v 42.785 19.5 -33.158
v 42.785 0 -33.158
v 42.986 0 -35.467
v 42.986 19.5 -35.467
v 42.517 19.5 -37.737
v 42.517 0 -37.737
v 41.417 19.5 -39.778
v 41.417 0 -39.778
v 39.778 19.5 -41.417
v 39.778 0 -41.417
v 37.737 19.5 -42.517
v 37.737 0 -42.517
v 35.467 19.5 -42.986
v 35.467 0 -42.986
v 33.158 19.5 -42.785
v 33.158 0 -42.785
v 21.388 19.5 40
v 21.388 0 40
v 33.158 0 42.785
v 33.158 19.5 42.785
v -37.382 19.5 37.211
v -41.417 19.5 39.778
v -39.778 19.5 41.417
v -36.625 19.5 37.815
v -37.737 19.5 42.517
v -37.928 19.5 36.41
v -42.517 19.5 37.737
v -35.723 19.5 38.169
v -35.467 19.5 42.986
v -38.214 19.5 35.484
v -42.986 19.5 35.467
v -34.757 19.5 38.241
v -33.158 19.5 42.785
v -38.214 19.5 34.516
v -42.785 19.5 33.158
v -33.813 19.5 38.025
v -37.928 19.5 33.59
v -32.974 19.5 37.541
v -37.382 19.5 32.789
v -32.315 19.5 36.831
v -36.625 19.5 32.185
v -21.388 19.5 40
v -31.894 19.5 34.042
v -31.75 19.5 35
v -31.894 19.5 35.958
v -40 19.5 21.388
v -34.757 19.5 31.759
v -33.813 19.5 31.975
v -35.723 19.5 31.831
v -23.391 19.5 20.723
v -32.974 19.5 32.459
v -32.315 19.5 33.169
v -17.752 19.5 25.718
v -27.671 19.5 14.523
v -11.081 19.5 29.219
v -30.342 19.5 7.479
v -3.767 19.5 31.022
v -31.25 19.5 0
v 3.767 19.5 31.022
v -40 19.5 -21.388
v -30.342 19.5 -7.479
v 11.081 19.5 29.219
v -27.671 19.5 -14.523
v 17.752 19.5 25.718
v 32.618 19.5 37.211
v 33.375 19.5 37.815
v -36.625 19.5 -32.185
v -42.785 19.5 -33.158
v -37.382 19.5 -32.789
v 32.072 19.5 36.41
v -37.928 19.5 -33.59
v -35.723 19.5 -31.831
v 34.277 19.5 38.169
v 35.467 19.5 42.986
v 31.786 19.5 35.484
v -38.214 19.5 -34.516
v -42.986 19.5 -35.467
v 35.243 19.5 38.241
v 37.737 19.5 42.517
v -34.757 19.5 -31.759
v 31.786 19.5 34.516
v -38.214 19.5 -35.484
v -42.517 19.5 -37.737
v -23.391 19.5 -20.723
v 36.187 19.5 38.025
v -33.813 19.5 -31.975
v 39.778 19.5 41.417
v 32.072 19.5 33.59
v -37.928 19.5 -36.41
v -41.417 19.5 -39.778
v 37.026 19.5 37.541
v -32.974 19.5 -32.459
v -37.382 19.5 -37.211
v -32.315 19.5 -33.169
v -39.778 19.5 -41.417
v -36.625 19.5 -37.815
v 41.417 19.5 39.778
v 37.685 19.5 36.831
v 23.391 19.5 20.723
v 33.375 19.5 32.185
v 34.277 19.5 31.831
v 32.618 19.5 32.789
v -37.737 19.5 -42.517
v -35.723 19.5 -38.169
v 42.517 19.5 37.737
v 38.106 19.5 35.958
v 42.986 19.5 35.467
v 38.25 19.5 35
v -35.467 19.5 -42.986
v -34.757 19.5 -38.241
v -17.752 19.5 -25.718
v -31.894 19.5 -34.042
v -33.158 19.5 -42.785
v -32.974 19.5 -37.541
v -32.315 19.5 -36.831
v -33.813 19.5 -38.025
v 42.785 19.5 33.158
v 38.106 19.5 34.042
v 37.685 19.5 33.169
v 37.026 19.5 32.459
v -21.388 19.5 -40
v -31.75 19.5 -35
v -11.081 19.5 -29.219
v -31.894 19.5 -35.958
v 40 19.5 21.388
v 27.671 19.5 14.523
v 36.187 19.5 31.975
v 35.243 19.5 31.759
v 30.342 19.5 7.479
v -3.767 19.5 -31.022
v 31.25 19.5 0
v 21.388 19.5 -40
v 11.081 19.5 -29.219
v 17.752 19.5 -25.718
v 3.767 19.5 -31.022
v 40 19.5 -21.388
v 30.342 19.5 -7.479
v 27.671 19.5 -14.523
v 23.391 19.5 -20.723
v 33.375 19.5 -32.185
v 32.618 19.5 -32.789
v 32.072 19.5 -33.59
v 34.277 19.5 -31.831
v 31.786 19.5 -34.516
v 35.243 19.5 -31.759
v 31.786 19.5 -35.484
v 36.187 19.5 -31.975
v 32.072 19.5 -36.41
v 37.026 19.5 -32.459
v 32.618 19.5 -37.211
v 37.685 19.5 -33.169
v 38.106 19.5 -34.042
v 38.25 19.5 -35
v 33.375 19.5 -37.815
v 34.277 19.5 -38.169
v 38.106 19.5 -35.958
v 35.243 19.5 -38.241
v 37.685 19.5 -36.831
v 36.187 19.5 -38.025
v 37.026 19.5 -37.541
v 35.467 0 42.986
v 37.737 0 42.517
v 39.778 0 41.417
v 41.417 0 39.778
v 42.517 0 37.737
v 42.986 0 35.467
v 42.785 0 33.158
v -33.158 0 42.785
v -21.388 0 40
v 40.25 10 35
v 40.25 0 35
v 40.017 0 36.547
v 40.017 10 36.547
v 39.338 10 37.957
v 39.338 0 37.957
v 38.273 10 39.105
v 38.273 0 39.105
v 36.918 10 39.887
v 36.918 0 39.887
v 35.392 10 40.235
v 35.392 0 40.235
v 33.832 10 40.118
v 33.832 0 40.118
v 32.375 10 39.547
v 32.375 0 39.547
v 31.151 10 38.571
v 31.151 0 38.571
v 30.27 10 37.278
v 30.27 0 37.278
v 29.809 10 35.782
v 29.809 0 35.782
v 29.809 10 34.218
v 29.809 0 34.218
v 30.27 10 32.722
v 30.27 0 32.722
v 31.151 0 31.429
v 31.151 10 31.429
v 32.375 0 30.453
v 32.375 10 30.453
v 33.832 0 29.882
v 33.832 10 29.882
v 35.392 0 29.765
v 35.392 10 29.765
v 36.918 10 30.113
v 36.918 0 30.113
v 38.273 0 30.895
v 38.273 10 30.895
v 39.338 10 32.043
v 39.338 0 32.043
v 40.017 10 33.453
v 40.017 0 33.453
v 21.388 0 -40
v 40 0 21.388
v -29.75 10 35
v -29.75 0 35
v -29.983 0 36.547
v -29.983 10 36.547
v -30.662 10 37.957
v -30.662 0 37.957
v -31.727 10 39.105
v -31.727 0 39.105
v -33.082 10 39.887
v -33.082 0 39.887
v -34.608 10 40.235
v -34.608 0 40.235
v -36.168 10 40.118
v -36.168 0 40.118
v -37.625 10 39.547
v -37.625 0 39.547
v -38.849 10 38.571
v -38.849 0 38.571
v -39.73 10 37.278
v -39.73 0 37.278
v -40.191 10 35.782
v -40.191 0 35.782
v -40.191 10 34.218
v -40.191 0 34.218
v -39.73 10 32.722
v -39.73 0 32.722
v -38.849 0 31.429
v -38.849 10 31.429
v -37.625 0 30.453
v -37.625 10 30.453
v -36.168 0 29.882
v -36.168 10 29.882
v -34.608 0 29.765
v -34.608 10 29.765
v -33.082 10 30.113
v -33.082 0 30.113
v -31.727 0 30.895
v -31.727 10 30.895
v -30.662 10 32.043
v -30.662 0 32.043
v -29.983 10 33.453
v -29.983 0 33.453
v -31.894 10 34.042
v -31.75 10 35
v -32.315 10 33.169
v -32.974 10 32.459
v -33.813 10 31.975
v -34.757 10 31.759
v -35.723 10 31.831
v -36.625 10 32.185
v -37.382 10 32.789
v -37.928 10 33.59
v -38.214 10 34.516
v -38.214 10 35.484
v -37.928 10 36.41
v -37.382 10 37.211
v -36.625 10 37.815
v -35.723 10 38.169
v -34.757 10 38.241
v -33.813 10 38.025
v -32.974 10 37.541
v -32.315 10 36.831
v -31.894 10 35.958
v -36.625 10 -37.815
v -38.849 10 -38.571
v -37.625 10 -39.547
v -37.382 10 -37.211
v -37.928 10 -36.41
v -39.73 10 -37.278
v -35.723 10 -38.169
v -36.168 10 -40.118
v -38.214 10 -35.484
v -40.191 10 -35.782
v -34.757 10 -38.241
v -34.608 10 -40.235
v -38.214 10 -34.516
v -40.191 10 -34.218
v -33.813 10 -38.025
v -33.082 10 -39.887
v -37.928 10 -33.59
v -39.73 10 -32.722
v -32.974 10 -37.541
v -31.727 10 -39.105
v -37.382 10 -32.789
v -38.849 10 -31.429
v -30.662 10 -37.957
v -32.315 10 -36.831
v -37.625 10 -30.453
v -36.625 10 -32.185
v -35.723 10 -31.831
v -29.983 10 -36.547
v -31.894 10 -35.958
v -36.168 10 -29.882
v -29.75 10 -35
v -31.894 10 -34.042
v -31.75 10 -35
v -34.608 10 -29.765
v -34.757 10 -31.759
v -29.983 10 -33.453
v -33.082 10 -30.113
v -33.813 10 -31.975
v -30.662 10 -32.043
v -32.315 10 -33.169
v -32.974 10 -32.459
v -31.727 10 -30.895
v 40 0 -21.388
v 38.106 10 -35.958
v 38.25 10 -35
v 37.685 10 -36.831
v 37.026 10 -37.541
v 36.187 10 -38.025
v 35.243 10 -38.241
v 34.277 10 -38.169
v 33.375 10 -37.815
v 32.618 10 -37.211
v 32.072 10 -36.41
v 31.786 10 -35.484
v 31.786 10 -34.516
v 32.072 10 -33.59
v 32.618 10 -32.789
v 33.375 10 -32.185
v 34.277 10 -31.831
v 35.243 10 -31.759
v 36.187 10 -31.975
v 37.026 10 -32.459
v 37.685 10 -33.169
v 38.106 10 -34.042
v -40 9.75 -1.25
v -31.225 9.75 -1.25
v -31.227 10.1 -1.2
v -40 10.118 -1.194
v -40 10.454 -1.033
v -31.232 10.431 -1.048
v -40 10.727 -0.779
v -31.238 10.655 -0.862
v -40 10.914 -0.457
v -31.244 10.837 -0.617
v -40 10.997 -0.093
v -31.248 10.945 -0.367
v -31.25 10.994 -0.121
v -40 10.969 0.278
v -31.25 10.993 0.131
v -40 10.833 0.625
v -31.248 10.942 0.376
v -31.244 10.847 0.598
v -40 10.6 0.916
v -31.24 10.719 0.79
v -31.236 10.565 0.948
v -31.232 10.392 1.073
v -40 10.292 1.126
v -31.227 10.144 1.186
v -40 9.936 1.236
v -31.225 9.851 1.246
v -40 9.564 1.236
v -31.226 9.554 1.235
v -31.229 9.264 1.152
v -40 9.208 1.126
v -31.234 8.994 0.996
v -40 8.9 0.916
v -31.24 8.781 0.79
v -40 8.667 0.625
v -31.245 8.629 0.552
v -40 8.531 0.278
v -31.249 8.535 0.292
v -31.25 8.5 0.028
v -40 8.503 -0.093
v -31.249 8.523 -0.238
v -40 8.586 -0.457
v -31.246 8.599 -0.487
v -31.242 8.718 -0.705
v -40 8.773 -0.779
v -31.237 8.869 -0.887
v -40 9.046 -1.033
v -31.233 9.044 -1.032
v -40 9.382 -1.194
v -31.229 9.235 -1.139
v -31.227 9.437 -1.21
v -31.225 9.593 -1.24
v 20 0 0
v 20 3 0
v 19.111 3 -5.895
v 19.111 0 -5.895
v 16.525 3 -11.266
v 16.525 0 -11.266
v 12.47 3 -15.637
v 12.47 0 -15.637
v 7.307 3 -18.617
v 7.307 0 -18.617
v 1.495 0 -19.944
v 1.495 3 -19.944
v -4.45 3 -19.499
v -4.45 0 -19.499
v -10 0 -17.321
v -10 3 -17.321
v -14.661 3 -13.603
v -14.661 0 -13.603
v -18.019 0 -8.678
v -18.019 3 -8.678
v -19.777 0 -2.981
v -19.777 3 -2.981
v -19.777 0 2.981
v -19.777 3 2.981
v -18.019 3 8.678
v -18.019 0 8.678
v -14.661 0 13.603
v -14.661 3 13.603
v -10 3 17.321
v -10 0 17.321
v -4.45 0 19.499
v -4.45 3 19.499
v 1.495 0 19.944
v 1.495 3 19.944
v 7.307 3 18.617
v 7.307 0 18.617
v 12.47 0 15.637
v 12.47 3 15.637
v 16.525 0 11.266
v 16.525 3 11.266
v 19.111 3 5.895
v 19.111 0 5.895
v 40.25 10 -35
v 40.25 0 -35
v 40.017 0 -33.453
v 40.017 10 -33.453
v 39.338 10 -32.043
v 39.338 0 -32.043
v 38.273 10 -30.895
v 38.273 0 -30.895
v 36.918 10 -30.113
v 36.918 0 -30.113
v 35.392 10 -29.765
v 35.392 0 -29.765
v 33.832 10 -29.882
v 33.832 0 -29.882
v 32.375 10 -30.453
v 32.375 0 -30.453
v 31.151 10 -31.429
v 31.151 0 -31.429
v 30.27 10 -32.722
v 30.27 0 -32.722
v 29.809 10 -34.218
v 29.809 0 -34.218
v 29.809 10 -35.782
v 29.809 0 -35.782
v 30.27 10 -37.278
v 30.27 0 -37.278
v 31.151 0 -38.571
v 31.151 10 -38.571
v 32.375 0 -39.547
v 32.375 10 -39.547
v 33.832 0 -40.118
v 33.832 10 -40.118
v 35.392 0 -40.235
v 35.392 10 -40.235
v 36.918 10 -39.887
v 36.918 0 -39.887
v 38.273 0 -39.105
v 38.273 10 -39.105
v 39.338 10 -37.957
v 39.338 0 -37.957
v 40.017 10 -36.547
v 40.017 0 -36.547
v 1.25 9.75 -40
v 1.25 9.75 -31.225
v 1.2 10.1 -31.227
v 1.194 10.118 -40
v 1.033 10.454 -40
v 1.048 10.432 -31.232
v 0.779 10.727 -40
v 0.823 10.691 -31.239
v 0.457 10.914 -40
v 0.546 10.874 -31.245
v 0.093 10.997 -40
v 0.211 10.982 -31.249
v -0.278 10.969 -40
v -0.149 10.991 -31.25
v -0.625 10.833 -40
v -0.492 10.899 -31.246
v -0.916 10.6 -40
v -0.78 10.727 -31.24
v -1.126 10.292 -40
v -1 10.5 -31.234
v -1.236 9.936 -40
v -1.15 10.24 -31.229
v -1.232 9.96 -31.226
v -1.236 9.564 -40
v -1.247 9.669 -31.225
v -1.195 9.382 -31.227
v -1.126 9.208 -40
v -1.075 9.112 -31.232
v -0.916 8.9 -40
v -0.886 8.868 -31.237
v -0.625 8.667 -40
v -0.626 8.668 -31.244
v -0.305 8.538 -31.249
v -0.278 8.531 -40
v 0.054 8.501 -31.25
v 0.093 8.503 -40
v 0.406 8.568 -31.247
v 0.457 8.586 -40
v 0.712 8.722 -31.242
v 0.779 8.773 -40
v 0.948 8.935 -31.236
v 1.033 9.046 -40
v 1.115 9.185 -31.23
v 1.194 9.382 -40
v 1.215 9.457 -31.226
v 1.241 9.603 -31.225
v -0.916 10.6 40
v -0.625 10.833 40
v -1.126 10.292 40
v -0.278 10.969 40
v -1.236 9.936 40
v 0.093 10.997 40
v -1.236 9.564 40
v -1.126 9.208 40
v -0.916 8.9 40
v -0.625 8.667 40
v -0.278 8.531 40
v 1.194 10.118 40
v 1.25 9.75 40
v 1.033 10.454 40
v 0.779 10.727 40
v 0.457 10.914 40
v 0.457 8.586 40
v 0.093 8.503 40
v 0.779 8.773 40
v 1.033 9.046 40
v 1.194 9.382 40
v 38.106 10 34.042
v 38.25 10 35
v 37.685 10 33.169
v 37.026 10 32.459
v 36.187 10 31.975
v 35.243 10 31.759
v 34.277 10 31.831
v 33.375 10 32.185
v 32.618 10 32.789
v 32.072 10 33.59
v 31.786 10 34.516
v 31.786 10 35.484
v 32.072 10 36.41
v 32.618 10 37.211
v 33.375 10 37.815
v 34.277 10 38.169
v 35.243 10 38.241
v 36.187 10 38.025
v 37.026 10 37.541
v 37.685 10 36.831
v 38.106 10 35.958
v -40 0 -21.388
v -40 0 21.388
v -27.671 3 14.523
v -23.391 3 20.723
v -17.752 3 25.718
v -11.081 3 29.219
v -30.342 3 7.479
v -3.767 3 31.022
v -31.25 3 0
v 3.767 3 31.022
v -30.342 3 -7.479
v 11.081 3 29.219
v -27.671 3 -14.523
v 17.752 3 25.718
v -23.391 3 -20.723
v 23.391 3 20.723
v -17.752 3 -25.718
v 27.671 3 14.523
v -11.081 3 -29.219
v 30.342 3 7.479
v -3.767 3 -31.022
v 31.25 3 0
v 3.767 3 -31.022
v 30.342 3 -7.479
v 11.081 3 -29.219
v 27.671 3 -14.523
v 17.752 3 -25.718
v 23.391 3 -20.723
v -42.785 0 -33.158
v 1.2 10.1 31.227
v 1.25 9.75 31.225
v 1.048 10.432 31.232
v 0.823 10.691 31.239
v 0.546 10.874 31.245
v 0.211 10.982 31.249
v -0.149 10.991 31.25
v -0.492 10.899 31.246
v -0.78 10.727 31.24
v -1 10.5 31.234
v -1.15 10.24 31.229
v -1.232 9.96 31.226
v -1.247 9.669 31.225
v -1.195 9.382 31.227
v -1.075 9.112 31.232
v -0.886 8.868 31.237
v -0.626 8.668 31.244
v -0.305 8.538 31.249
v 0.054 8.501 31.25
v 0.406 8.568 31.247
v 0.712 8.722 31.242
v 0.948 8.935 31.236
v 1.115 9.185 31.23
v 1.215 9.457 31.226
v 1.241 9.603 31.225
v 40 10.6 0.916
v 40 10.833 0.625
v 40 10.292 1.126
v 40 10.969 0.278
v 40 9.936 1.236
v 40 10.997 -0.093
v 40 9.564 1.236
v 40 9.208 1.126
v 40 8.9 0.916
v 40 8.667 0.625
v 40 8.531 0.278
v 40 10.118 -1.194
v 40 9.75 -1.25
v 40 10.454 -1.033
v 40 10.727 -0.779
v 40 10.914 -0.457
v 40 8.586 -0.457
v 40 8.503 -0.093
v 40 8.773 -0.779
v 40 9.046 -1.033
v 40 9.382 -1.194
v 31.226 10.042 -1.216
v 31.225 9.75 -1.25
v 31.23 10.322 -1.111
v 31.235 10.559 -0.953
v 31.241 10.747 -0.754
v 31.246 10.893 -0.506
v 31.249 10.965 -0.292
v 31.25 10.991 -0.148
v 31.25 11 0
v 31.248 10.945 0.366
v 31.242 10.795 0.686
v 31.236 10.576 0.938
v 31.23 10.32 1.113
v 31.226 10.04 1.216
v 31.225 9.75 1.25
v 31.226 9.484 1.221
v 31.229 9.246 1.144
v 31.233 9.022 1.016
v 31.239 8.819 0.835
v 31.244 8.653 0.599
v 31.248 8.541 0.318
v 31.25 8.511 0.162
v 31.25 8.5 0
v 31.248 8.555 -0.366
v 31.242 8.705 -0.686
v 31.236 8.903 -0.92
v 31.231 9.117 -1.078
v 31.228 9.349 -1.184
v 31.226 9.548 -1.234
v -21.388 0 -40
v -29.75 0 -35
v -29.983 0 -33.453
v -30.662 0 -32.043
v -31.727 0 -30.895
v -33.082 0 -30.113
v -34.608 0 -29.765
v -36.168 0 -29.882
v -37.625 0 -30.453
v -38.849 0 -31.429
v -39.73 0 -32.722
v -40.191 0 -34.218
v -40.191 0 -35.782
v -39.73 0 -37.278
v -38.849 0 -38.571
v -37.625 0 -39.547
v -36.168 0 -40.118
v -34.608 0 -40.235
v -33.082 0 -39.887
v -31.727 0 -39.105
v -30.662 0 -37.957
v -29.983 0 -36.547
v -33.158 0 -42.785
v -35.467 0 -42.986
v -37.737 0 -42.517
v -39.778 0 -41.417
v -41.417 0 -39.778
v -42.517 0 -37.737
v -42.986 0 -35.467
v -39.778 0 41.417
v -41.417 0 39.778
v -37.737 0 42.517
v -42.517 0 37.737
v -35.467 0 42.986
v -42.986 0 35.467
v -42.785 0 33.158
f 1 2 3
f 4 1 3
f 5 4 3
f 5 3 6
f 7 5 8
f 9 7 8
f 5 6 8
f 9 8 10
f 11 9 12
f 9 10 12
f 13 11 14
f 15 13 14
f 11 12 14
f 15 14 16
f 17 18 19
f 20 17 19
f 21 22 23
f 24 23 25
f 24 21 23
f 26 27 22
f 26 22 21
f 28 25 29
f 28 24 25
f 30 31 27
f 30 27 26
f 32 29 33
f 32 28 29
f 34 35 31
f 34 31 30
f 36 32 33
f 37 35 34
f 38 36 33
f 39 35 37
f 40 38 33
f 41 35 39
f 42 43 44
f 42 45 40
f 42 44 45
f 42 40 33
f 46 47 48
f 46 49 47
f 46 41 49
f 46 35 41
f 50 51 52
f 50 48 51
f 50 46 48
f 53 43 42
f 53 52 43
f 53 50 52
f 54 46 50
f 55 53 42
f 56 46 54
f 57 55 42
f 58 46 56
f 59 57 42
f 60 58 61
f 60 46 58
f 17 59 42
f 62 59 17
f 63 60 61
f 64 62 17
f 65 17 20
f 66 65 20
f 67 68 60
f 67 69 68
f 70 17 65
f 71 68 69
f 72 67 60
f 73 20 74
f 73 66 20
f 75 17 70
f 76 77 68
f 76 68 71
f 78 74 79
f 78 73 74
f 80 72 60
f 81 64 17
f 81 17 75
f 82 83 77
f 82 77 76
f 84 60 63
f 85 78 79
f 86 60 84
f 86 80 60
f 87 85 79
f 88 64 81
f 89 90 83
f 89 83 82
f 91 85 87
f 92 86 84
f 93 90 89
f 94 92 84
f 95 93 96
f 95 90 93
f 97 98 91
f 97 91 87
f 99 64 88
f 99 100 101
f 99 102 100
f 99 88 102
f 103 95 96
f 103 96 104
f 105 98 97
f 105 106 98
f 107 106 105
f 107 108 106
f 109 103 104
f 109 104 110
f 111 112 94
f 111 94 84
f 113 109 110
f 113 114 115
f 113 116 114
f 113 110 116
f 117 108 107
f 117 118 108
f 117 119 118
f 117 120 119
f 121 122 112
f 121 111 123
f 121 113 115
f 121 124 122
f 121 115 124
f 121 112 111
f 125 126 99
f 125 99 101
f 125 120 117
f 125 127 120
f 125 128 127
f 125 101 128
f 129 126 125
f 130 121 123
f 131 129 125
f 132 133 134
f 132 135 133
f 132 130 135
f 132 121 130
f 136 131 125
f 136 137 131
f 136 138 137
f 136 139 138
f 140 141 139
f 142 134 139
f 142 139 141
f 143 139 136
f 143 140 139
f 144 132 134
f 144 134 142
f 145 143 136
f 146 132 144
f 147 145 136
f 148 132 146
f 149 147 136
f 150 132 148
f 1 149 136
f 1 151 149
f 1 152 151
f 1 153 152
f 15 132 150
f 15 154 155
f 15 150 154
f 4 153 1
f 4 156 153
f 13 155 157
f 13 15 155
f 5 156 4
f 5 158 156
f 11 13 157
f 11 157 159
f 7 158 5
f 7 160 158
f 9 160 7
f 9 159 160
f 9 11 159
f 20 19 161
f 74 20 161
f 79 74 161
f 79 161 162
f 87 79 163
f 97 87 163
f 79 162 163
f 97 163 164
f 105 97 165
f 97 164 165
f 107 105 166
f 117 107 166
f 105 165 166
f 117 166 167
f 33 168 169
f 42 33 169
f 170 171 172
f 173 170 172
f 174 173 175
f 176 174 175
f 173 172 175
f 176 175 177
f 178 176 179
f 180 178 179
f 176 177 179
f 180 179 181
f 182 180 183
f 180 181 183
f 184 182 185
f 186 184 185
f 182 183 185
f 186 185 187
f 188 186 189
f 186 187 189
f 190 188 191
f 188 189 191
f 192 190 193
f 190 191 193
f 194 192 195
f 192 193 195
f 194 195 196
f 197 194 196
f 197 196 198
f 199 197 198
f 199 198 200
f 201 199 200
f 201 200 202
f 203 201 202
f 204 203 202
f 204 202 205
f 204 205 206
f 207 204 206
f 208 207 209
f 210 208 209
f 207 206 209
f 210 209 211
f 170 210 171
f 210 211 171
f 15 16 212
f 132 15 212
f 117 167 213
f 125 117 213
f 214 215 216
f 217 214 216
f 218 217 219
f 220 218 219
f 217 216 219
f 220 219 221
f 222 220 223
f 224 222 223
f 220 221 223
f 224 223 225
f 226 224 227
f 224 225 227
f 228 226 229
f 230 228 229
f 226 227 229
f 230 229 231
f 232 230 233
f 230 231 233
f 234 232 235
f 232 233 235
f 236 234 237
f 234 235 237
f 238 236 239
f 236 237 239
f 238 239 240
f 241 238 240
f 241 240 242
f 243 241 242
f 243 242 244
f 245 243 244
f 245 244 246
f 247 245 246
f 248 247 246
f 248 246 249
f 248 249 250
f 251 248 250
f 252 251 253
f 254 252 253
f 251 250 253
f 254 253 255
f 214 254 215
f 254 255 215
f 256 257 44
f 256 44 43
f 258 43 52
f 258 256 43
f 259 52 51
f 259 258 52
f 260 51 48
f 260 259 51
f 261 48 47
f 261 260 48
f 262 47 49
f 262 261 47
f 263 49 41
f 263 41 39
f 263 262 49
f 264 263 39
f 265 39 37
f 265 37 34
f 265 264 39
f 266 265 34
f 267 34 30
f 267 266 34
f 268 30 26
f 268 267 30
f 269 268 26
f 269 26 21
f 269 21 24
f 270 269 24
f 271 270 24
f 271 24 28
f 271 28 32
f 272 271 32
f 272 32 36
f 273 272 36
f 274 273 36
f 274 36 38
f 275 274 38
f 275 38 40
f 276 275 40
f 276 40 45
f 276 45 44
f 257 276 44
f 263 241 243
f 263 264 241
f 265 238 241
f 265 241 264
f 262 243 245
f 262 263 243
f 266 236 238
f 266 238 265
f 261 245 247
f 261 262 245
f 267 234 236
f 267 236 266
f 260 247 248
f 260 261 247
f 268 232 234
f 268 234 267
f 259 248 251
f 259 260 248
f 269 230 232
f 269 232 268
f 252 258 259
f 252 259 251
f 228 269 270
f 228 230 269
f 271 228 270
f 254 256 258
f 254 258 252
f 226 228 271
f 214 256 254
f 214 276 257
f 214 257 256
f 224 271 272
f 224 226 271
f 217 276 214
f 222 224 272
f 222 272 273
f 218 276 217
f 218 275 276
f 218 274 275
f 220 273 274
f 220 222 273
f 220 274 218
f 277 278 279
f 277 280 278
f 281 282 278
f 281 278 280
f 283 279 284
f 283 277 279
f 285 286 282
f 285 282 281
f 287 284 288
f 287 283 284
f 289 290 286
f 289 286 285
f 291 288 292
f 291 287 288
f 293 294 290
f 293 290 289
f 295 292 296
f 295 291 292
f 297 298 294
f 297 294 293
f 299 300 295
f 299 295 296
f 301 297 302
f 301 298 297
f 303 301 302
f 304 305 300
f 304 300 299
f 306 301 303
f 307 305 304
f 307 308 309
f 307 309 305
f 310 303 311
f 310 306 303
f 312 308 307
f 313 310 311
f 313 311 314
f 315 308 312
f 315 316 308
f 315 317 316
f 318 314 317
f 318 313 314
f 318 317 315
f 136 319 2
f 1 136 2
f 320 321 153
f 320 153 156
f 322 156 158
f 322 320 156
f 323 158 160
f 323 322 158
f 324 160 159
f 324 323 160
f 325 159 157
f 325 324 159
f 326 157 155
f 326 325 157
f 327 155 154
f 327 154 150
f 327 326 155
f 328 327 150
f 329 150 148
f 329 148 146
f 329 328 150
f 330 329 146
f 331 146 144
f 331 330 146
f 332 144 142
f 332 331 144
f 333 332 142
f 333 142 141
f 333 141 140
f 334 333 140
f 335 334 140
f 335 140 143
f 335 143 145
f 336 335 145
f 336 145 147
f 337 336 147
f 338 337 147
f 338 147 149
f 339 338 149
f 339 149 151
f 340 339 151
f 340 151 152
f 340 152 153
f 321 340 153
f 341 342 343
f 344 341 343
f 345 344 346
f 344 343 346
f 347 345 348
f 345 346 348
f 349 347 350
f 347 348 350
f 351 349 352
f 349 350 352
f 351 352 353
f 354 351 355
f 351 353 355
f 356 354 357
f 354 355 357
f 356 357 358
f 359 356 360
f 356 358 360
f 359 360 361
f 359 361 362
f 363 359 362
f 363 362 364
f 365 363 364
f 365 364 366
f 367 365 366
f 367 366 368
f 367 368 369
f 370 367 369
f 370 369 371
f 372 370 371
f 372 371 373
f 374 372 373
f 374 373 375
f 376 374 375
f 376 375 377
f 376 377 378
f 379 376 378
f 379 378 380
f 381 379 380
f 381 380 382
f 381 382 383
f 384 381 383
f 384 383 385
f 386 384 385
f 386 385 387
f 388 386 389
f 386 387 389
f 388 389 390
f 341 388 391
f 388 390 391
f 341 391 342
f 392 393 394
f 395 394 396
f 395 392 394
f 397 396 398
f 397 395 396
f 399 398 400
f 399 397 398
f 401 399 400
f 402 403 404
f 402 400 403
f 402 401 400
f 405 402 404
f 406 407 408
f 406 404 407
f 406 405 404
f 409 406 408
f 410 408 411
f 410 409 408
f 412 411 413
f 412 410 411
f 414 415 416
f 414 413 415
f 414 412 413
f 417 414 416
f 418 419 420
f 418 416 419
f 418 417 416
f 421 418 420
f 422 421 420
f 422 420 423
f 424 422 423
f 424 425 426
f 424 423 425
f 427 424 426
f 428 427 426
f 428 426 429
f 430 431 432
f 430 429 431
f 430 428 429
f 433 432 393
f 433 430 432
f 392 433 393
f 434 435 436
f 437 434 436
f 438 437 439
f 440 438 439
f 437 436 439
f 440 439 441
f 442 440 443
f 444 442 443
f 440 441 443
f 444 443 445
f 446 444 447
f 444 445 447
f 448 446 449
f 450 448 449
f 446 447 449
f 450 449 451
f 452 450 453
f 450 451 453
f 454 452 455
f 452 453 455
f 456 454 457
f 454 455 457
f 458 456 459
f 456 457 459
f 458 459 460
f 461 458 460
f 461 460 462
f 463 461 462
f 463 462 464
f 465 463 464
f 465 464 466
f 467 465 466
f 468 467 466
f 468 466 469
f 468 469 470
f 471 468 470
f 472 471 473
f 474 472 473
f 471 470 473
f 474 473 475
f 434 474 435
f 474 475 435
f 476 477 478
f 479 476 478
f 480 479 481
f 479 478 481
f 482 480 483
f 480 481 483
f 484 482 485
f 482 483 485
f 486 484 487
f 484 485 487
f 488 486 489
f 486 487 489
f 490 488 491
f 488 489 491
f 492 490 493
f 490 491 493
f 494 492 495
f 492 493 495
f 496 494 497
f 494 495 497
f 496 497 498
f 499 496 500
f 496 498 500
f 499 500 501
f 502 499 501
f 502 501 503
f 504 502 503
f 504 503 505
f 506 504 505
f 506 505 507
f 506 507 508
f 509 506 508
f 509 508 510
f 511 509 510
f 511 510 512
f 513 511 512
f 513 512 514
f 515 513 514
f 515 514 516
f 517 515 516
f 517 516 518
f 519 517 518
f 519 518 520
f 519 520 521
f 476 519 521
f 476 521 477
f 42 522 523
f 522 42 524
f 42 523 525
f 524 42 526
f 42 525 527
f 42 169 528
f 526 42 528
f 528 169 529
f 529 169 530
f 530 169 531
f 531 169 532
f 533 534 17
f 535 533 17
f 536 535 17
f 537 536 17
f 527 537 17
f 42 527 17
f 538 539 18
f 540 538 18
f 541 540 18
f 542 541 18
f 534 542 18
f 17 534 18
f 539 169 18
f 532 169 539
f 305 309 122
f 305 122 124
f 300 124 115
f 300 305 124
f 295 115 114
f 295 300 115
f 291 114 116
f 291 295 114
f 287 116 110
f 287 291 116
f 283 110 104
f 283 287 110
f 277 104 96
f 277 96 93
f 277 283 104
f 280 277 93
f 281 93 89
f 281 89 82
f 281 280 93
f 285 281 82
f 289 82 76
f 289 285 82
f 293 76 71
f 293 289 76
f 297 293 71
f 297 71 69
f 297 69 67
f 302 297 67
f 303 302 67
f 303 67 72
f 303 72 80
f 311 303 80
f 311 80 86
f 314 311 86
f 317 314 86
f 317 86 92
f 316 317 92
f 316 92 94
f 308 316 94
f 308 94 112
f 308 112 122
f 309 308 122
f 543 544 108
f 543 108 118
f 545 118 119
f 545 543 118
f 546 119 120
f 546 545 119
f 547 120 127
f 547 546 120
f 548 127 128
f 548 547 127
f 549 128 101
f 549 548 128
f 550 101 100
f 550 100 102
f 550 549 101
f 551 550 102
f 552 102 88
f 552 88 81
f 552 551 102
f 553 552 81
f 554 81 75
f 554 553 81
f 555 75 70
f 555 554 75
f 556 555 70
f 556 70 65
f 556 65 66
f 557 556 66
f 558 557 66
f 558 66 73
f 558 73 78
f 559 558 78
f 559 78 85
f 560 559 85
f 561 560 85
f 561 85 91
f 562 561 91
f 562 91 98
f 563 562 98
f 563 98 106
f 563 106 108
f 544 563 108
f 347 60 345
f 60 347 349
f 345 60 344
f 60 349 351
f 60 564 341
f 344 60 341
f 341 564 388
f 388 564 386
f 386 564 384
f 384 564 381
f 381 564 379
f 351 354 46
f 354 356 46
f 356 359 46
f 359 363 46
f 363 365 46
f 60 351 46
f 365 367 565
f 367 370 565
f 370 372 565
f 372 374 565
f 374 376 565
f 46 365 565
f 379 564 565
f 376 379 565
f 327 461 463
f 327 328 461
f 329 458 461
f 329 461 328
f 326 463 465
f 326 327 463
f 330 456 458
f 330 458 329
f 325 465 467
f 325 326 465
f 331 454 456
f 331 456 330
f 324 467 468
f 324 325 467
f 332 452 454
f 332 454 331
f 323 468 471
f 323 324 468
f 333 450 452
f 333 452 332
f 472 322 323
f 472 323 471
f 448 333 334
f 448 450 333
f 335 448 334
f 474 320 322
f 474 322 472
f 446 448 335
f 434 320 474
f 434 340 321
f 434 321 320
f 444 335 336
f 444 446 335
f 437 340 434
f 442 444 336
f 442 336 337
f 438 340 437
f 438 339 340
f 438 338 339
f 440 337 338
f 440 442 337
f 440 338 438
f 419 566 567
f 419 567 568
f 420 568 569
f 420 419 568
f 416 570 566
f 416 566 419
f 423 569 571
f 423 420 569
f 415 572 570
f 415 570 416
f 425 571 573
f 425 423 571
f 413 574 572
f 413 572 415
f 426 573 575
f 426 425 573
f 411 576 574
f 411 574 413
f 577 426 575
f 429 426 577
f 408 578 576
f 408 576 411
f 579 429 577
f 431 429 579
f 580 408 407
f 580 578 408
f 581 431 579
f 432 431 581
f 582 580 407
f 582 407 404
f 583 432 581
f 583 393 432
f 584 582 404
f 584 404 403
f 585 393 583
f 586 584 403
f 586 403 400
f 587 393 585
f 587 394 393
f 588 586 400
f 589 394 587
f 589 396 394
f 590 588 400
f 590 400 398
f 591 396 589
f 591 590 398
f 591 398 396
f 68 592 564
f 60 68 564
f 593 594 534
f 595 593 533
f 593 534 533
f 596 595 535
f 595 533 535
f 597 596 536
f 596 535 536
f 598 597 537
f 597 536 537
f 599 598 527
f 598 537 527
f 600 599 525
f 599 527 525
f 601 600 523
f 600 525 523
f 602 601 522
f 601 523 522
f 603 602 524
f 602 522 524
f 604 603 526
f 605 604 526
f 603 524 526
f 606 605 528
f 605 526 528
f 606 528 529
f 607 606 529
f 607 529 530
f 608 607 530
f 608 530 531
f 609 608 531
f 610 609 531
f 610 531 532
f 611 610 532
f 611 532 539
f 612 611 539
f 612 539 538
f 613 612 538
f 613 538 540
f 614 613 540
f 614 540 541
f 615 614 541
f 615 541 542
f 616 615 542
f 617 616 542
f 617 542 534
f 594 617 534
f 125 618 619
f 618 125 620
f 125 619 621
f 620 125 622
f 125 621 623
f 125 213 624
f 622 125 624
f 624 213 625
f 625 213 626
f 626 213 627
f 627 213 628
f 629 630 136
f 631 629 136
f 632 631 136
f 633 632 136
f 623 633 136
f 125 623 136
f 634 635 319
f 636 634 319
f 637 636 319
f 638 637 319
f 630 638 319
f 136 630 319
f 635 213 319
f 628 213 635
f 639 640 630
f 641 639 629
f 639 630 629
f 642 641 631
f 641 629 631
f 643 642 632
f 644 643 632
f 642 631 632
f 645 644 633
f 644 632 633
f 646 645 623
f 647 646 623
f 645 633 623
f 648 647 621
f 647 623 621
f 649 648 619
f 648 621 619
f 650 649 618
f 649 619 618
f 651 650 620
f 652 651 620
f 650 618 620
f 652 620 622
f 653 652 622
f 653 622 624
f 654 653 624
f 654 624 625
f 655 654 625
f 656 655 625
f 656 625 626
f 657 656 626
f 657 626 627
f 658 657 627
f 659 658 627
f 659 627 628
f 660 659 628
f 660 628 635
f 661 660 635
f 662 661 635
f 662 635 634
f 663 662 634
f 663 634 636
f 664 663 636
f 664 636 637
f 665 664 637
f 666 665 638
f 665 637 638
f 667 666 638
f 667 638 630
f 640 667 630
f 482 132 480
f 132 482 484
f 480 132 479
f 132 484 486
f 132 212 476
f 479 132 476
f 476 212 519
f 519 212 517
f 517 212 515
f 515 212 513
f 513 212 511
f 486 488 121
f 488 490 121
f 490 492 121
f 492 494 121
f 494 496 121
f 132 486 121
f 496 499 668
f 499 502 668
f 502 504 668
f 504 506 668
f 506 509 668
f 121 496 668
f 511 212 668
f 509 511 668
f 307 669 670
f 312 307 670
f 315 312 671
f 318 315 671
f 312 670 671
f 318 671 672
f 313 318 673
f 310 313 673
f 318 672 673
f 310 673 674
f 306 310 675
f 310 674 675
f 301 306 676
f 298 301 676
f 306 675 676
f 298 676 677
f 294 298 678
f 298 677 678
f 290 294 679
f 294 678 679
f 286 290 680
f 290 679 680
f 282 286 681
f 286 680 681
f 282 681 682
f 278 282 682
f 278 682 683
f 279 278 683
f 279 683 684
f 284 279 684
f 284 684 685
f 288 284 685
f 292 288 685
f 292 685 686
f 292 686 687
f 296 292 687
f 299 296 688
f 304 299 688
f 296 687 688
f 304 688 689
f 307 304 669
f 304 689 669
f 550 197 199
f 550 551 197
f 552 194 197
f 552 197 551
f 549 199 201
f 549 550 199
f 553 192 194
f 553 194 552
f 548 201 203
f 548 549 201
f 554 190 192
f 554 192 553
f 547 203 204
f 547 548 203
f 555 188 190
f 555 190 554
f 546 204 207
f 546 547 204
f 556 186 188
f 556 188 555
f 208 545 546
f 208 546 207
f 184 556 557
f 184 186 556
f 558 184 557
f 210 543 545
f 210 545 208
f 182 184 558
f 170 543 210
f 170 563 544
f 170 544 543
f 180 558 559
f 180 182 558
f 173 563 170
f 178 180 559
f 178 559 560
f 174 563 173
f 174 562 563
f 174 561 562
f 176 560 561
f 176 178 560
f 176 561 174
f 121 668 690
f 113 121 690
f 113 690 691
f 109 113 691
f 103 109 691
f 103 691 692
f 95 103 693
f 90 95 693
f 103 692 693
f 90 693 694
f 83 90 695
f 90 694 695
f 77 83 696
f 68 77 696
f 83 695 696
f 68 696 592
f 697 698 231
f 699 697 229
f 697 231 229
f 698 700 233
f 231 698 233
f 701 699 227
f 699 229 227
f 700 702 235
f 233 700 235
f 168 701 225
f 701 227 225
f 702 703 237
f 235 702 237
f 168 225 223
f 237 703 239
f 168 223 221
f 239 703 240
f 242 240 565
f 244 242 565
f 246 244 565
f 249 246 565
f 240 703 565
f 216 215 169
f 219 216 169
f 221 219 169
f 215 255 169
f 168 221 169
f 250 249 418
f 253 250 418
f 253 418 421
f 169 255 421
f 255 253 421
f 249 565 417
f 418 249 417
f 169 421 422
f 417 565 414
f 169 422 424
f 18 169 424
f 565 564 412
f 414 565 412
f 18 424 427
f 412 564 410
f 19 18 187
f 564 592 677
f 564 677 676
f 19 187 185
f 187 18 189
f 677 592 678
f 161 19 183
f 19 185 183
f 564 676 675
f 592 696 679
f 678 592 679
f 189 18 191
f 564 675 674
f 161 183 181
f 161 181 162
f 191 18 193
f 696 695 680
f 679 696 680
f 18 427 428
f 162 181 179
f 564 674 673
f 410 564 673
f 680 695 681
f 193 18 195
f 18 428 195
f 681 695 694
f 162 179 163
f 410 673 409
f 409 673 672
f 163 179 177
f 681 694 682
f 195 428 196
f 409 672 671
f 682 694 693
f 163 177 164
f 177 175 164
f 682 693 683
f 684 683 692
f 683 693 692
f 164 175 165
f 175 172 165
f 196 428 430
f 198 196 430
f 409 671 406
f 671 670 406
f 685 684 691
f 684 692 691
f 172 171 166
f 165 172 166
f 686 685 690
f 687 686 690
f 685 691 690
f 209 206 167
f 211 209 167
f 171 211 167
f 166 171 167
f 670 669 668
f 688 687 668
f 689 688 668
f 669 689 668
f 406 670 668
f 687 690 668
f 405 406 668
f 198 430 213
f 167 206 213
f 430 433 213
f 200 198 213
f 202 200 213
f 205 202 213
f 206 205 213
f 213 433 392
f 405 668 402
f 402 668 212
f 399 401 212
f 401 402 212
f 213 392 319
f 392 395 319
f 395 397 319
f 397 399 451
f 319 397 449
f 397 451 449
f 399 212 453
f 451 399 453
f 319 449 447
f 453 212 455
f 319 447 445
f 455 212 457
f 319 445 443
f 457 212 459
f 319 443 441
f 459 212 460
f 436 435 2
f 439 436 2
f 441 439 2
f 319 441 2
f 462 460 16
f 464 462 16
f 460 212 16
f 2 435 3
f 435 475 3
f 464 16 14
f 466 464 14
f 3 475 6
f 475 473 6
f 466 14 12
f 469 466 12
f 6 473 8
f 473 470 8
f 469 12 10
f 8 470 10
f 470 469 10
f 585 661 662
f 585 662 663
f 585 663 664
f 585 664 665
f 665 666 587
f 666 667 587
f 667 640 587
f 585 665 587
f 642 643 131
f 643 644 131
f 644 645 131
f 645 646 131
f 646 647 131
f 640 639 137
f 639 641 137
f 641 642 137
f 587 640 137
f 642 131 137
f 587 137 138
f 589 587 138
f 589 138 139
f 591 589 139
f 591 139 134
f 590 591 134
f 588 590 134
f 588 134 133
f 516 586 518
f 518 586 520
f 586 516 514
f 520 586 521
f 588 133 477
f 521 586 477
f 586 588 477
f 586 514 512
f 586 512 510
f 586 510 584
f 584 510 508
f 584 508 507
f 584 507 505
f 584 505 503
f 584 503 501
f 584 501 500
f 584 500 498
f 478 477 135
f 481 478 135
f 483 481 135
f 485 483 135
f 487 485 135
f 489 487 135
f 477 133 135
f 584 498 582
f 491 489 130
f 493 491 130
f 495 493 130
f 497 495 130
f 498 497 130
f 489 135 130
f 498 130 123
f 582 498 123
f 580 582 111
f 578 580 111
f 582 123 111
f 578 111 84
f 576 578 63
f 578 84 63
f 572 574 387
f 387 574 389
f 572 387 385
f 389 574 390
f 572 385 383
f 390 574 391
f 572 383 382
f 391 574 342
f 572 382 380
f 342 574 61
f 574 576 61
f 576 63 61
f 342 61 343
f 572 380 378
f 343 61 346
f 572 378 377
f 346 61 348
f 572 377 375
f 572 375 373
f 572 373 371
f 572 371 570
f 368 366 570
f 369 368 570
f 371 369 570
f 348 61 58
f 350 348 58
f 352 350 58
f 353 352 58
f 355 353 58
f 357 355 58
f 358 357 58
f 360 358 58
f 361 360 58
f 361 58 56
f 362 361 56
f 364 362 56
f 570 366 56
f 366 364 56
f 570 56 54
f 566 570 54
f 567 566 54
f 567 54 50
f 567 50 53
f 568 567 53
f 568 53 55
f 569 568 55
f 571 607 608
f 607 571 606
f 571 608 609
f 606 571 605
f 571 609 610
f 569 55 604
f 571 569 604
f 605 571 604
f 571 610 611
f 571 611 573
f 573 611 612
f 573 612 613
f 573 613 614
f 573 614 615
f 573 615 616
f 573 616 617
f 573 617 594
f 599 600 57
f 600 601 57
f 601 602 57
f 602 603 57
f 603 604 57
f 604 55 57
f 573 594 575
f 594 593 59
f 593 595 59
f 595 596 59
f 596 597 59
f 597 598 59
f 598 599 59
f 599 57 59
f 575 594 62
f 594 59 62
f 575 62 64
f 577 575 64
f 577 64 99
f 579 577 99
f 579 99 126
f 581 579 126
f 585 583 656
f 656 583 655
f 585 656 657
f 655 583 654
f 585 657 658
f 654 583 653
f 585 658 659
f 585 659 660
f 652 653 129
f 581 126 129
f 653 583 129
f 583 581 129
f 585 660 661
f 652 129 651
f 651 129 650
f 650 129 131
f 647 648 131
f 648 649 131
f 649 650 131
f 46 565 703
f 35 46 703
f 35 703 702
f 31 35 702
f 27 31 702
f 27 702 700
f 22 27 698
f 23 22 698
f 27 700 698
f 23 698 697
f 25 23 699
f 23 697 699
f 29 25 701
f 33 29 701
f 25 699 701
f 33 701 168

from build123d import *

# Parameters (mm, degrees)
SKETCH1_R           = 3.25
SKETCH1_R_2         = 20
BOSS_EXTRUDE1_DEPTH = 19.5
SKETCH2_R           = 31.25
CUT_EXTRUDE1_DEPTH  = 16.5
SKETCH3_R           = 5.25
CUT_EXTRUDE2_DEPTH  = 10
SKETCH4_R           = 1.25
CUT_EXTRUDE3_DEPTH  = 80
SKETCH5_R           = 1.25
CUT_EXTRUDE4_DEPTH  = 80


with BuildPart() as part:
    # Sketch1 → Boss-Extrude1 (new body)
    with BuildSketch(Plane(origin=(0, 0, 0), x_dir=(1, 0, 0), z_dir=(0, 1, 0))):
        with BuildLine():
            Line((-21.388284323, 40), (-33.157842357, 42.785014786))
            ThreePointArc((-33.157842357, 42.785014786), (-40.656854249, 40.656854249), (-42.785014786, 33.157842357))
            Line((-42.785014786, 33.157842357), (-40, 21.388284323))
            Line((-40, 21.388284323), (-40, -21.388284323))
            Line((-40, -21.388284323), (-42.785014786, -33.157842357))
            ThreePointArc((-42.785014786, -33.157842357), (-40.656854249, -40.656854249), (-33.157842357, -42.785014786))
            Line((-33.157842357, -42.785014786), (-21.388284323, -40))
            Line((-21.388284323, -40), (21.388284323, -40))
            Line((21.388284323, -40), (33.157842357, -42.785014786))
            ThreePointArc((33.157842357, -42.785014786), (40.656854249, -40.656854249), (42.785014786, -33.157842357))
            Line((42.785014786, -33.157842357), (40, -21.388284323))
            Line((40, -21.388284323), (40, 21.388284323))
            Line((40, 21.388284323), (42.785014786, 33.157842357))
            ThreePointArc((42.785014786, 33.157842357), (40.656854249, 40.656854249), (33.157842357, 42.785014786))
            Line((33.157842357, 42.785014786), (21.388284323, 40))
            Line((21.388284323, 40), (-21.388284323, 40))
        make_face()
        with Locations((35, 35)):
            Circle(SKETCH1_R, mode=Mode.SUBTRACT)
        with Locations((-35, -35)):
            Circle(SKETCH1_R, mode=Mode.SUBTRACT)
        with Locations((35, -35)):
            Circle(SKETCH1_R, mode=Mode.SUBTRACT)
        with Locations((-35, 35)):
            Circle(SKETCH1_R, mode=Mode.SUBTRACT)
        Circle(SKETCH1_R_2, mode=Mode.SUBTRACT)
    extrude(amount=BOSS_EXTRUDE1_DEPTH)

    # Sketch2 → Cut-Extrude1 (cut)
    with BuildSketch(Plane(origin=(0, 19.5, 0), x_dir=(1, 0, 0), z_dir=(0, 1, 0))):
        Circle(SKETCH2_R)
    extrude(amount=-CUT_EXTRUDE1_DEPTH, mode=Mode.SUBTRACT)

    # Sketch3 → Cut-Extrude2 (cut)
    with BuildSketch(Plane.XZ):
        with Locations((-35, 35)):
            Circle(SKETCH3_R)
        with Locations((35, 35)):
            Circle(SKETCH3_R)
        with Locations((35, -35)):
            Circle(SKETCH3_R)
        with Locations((-35, -35)):
            Circle(SKETCH3_R)
    extrude(amount=-CUT_EXTRUDE2_DEPTH, mode=Mode.SUBTRACT)

    # Sketch4 → Cut-Extrude3 (cut)
    with BuildSketch(Plane.XY.offset(40)):
        with Locations((0, 9.75)):
            Circle(SKETCH4_R)
    extrude(amount=-CUT_EXTRUDE3_DEPTH, mode=Mode.SUBTRACT)

    # Sketch5 → Cut-Extrude4 (cut)
    with BuildSketch(Plane(origin=(40, 0, 0), x_dir=(0, 0, -1), z_dir=(1, 0, 0))):
        with Locations((0, 9.75)):
            Circle(SKETCH5_R)
    extrude(amount=-CUT_EXTRUDE4_DEPTH, mode=Mode.SUBTRACT)


solid = part.part
